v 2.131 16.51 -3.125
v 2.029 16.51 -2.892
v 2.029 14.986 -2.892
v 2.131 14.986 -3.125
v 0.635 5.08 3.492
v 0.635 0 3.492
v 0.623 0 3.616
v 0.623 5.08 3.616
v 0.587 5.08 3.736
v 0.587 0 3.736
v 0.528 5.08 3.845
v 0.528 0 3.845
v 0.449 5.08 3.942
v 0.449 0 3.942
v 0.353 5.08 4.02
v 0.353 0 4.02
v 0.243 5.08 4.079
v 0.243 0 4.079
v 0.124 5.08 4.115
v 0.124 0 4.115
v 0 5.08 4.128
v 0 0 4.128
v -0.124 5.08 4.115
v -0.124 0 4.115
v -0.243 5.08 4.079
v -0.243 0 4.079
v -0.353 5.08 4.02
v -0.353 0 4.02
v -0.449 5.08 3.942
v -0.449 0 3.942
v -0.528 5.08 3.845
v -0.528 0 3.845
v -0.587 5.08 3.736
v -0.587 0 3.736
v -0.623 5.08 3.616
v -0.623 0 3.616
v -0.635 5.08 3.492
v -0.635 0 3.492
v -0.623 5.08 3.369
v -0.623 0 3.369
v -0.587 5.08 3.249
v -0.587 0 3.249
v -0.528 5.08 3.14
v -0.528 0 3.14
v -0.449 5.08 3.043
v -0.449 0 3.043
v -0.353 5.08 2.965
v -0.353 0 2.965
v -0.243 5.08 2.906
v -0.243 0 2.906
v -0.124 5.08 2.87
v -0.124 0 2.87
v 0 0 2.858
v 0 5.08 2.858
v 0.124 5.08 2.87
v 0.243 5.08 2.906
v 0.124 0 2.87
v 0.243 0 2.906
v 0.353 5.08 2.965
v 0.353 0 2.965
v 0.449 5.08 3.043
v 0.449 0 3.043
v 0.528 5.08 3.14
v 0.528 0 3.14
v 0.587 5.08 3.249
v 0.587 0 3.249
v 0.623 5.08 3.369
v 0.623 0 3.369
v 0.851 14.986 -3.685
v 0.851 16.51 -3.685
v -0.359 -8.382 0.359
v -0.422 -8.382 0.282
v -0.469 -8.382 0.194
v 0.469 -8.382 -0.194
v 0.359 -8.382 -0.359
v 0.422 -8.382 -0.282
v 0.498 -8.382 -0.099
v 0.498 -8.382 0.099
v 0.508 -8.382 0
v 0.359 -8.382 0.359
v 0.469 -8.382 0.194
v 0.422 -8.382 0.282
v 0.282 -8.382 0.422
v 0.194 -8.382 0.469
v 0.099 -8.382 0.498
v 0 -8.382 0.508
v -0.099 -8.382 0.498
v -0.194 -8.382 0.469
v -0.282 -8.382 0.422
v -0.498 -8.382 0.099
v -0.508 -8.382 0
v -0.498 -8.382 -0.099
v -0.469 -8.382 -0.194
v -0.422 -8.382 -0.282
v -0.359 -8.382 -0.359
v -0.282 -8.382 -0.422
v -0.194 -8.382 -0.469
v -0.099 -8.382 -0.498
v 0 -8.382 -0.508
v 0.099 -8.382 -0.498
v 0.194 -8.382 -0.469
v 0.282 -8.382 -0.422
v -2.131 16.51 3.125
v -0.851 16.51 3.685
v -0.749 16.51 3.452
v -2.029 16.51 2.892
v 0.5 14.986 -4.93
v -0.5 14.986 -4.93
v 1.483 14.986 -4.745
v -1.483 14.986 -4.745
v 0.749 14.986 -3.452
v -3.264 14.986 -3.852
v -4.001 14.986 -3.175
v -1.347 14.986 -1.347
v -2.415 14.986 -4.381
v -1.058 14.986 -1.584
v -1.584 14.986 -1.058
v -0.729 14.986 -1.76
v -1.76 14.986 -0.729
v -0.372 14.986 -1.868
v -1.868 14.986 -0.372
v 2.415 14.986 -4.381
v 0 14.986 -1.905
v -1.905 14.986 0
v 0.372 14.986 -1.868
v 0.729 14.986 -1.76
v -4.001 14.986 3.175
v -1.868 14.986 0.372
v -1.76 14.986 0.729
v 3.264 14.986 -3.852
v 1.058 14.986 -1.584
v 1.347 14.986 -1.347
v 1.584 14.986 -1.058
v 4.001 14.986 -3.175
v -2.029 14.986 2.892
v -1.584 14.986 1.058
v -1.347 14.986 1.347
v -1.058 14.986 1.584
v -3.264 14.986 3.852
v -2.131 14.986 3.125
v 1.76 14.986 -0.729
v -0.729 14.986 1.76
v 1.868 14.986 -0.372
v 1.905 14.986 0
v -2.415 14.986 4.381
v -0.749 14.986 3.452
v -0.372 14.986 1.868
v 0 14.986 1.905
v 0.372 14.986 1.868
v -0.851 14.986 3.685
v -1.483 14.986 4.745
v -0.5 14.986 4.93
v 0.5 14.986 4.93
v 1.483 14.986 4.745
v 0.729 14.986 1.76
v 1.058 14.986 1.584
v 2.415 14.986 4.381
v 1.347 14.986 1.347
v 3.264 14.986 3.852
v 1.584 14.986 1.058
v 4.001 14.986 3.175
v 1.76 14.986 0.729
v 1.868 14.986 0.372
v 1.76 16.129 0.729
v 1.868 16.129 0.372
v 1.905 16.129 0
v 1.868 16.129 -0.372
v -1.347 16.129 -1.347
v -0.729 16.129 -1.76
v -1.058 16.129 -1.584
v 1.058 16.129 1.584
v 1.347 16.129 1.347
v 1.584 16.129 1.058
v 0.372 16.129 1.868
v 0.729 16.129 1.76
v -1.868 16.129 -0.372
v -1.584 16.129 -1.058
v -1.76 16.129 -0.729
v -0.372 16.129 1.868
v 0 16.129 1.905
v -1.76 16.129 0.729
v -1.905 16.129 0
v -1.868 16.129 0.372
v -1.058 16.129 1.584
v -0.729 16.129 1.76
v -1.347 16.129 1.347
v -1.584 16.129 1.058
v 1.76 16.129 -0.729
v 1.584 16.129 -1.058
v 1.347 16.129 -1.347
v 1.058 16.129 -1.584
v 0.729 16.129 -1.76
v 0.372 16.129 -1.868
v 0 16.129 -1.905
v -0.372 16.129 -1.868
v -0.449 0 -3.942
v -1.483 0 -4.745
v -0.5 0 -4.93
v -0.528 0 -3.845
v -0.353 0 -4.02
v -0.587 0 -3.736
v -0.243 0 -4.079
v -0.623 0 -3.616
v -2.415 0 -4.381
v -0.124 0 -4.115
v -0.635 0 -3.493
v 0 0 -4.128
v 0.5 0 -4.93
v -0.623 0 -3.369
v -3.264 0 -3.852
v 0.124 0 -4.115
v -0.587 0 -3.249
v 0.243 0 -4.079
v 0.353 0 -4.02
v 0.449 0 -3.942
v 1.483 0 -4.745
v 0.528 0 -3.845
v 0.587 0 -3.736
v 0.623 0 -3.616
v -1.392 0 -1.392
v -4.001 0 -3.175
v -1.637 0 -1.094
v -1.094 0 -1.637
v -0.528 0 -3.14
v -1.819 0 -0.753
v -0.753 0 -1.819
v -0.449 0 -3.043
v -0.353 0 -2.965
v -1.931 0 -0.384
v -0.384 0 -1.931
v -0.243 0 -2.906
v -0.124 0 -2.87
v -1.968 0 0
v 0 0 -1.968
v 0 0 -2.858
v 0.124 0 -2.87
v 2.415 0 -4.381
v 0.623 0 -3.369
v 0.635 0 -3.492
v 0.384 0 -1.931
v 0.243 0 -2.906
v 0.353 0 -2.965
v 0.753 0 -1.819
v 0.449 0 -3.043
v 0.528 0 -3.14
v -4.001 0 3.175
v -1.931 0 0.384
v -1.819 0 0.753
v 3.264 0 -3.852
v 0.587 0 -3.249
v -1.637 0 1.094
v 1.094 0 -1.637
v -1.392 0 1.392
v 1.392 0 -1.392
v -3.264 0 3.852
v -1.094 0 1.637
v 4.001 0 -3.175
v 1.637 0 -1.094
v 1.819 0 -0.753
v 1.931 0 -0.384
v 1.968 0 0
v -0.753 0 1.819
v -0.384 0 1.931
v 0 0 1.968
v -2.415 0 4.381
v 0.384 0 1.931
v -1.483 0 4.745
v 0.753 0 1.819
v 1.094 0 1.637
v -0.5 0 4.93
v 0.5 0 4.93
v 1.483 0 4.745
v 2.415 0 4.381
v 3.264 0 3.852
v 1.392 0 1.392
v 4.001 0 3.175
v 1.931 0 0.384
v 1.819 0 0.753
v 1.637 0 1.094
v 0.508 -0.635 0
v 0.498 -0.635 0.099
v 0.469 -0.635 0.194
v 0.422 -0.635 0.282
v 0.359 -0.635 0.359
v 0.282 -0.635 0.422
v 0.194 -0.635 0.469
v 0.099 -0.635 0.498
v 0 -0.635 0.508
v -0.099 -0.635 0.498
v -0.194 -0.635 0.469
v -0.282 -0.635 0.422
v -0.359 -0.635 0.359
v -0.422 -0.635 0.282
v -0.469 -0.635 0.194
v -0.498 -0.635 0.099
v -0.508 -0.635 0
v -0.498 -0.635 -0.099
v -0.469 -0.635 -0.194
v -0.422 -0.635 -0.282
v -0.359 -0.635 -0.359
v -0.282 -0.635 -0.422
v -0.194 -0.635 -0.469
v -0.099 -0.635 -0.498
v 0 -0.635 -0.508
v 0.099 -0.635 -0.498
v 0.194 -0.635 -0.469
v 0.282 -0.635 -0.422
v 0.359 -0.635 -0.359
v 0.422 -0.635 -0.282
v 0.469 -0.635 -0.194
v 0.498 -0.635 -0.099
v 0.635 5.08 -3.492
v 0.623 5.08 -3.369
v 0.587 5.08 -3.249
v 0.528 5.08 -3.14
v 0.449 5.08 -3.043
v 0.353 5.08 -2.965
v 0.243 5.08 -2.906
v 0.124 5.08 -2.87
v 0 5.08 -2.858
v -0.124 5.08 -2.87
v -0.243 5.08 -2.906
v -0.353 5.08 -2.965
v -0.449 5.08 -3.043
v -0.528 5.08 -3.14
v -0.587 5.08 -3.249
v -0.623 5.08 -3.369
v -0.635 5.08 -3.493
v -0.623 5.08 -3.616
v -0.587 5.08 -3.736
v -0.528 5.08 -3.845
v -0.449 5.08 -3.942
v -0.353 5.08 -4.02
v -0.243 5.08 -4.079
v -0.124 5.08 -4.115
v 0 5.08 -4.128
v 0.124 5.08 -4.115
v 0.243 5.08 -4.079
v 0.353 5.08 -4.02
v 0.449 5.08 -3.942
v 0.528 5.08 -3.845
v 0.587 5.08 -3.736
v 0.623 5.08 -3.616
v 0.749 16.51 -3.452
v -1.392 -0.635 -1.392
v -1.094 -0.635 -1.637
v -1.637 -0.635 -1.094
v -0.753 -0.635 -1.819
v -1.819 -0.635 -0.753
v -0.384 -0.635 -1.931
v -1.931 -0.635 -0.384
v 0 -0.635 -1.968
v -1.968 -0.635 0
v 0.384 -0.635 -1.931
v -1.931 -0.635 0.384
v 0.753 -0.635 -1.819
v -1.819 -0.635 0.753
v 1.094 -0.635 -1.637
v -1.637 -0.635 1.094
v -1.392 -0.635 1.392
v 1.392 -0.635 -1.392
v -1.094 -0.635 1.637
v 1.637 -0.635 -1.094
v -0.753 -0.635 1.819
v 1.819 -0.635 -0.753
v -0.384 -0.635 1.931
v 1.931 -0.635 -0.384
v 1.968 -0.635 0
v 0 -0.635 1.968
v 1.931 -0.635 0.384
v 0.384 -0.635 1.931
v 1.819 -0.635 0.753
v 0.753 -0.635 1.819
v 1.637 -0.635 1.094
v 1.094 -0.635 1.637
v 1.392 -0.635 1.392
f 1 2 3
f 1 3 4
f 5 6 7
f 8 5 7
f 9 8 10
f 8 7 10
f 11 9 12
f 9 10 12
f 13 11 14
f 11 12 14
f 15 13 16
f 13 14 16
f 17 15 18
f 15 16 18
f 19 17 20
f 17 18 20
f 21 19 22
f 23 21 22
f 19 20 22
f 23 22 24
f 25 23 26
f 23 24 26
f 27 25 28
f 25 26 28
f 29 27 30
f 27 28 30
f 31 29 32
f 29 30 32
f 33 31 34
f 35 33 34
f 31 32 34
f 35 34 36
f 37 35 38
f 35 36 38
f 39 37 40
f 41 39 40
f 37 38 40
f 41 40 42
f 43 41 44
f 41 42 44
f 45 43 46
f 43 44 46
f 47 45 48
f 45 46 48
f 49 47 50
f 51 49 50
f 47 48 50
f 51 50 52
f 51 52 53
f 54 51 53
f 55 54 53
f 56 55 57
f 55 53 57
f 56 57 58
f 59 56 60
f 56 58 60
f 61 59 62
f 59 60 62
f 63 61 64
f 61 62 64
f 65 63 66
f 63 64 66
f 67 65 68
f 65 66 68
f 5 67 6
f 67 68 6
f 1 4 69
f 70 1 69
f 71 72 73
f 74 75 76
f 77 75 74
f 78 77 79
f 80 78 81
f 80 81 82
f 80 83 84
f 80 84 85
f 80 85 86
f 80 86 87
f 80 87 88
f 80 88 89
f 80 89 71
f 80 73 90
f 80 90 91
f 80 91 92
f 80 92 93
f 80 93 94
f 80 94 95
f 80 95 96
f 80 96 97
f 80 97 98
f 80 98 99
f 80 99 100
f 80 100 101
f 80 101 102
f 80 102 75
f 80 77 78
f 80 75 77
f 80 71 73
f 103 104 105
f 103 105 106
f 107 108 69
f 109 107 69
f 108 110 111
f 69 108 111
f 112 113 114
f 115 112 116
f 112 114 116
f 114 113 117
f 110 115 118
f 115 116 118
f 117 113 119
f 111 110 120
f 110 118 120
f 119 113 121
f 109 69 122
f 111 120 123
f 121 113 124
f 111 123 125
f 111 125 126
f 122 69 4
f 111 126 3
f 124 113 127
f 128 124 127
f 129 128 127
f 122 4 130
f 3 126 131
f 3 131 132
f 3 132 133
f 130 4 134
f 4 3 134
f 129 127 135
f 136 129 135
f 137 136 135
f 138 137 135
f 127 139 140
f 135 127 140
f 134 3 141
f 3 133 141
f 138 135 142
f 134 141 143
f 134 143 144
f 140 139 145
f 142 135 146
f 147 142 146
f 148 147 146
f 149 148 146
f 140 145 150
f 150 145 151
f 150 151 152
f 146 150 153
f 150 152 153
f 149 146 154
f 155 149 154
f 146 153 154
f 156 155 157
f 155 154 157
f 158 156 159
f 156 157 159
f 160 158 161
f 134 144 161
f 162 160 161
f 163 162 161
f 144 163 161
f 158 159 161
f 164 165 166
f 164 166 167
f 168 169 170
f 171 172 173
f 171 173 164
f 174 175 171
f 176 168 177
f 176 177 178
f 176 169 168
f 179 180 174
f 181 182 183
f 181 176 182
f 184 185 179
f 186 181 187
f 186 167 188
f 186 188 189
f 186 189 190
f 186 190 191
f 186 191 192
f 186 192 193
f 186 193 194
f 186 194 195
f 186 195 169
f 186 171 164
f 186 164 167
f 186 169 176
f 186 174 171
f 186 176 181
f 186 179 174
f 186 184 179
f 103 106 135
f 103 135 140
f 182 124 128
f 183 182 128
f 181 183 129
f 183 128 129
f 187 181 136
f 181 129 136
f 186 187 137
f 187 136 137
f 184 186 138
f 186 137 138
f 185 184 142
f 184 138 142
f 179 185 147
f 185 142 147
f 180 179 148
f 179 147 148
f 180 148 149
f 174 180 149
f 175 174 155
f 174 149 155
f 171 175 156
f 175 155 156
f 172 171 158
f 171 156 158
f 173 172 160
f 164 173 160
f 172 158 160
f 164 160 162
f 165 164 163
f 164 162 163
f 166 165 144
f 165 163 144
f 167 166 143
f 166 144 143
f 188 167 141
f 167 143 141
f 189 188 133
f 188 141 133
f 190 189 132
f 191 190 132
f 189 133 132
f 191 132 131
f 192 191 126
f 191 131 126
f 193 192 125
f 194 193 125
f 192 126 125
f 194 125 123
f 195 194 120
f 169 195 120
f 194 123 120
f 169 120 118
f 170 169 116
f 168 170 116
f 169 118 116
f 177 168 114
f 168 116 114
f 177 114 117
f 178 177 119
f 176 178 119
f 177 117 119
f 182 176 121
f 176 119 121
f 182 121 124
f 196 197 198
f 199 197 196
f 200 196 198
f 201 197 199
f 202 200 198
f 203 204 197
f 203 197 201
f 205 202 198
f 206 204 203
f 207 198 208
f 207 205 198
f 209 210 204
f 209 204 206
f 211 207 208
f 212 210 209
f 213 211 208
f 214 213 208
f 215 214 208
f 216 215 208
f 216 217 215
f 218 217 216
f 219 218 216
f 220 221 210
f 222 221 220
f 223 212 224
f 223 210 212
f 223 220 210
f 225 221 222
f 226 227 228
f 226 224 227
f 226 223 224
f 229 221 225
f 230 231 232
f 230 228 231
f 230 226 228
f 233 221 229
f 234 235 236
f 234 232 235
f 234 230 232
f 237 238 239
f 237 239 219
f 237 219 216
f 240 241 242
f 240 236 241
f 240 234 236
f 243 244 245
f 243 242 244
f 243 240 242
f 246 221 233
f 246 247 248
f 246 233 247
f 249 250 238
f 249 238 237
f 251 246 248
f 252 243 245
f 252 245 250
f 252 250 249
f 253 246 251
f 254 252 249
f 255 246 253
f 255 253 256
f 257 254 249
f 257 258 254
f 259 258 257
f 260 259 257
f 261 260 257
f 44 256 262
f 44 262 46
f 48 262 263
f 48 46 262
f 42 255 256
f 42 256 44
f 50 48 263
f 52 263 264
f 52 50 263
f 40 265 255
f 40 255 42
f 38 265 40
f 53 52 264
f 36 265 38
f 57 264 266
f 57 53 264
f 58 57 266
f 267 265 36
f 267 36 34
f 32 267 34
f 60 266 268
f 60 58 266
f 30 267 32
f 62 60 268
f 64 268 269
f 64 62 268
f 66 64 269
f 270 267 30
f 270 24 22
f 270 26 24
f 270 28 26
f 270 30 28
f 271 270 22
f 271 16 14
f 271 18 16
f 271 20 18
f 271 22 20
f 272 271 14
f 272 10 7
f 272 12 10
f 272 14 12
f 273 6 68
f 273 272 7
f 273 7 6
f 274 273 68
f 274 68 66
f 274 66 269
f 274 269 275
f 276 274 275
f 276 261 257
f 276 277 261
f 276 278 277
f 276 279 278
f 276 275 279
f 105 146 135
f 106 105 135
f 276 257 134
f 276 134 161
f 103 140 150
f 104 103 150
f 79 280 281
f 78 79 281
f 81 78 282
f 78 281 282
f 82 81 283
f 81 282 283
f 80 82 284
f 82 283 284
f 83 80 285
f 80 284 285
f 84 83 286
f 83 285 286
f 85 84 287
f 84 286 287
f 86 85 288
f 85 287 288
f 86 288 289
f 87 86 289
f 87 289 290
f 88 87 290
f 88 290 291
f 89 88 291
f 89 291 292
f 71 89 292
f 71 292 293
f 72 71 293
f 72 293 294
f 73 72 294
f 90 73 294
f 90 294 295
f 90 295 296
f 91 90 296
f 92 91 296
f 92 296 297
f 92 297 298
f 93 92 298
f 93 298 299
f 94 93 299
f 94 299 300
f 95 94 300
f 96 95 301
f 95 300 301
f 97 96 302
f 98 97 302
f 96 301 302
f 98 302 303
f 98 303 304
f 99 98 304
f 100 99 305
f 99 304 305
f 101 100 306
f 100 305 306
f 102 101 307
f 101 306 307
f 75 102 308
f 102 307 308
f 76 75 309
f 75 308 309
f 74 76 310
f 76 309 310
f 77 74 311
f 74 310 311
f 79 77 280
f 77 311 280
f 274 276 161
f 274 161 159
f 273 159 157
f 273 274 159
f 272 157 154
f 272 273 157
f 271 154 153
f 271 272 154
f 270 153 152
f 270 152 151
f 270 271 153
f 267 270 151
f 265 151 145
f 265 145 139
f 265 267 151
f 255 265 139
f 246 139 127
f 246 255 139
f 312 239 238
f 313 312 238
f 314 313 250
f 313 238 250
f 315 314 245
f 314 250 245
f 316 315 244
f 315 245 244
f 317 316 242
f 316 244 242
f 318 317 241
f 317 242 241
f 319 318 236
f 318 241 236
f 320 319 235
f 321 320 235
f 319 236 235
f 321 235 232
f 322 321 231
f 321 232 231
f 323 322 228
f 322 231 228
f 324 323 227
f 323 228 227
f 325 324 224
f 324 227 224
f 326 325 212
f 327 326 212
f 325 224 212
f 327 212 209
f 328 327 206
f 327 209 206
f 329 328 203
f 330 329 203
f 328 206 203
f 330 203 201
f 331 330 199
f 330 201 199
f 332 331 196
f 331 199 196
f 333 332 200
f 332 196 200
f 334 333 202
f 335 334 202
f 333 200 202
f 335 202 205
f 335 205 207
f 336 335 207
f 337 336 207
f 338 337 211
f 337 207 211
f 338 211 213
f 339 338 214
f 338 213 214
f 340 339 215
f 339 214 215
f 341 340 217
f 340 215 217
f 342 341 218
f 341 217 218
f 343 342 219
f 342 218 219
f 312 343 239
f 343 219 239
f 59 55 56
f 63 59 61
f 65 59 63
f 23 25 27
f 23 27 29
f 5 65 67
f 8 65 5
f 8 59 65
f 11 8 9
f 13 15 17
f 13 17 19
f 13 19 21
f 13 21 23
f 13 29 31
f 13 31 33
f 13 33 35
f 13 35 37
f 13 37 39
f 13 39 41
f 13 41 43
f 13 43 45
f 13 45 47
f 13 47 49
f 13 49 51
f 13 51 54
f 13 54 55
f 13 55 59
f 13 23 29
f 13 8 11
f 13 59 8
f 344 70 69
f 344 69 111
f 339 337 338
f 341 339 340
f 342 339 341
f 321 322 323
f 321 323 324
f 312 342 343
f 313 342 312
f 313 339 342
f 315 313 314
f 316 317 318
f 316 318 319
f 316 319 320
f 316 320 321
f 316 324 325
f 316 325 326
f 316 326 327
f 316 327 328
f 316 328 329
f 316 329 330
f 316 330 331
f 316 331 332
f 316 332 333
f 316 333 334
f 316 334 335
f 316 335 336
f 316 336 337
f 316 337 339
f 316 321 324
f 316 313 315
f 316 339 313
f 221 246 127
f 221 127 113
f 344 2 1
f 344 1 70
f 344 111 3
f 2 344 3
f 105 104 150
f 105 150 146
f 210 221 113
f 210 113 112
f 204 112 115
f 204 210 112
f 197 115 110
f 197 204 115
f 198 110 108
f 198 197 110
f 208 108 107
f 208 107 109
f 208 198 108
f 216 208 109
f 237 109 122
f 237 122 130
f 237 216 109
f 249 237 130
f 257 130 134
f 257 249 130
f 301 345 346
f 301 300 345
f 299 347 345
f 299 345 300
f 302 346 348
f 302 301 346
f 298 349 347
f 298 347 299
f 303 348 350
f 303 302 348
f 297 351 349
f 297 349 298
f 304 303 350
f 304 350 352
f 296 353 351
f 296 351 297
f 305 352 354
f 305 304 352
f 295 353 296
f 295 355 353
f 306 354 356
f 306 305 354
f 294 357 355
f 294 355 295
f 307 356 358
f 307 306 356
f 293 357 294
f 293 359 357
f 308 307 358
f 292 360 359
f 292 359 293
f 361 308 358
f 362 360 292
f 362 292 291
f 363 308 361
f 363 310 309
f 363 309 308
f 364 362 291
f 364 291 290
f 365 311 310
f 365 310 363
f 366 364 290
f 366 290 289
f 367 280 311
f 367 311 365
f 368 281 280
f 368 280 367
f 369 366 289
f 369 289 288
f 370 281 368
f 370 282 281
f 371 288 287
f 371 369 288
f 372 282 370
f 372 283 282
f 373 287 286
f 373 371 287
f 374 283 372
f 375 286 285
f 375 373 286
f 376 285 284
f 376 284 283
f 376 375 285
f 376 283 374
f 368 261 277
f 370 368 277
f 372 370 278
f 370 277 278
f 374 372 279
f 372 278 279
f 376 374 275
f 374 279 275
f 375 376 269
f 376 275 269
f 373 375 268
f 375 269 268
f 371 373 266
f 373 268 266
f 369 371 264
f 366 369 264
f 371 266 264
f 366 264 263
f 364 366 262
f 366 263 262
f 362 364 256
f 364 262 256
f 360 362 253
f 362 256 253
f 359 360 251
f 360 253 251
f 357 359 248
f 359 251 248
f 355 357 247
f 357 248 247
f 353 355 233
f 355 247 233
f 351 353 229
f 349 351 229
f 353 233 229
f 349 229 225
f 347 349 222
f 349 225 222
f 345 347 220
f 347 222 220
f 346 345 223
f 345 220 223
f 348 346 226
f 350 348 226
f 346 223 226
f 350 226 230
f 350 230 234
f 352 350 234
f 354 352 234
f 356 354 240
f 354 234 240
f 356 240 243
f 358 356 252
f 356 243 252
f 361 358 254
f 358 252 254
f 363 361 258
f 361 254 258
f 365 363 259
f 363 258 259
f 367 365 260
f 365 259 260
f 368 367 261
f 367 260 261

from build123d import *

# Parameters (mm, degrees)
F1_DEPTH  = 14.986
F2_R      = 0.508
F3_DEPTH  = 8.382
F4_R      = 0.635
F5_DEPTH  = 5.08
F6_R      = 1.9685
F7_DEPTH  = 0.635
F8_R      = 1.905
F9_DEPTH  = 1.143
F11_DEPTH = 1.524


with BuildPart() as f1:
    # F0 (on Front) → F1 (new body)
    with BuildSketch(Plane.XZ):
        with BuildLine():
            Line((4.0005, -3.175), (4.0005, 3.175))
            ThreePointArc((4.0005, 3.175), (0, 4.953), (-4.0005, 3.175))
            Line((-4.0005, 3.175), (-4.0005, -3.175))
            ThreePointArc((-4.0005, -3.175), (0, -4.953), (4.0005, -3.175))
        make_face()
    extrude(amount=-F1_DEPTH)

    # F2 (on face) → F3 (join)
    with BuildSketch(Plane.XZ):
        Circle(F2_R)
    extrude(amount=F3_DEPTH)

    # F4 (on face) → F5 (cut)
    with BuildSketch(Plane.XZ):
        with Locations((0, 3.4925)):
            Circle(F4_R)
        with Locations((0, -3.4925)):
            Circle(F4_R)
    extrude(amount=-F5_DEPTH, mode=Mode.SUBTRACT)

    # F6 (on face) → F7 (join)
    with BuildSketch(Plane.XZ):
        Circle(F6_R)
    extrude(amount=F7_DEPTH)

    # F8 (on face) → F9 (join)
    with BuildSketch(Plane(origin=(0, 14.986, 0), x_dir=(-1, 0, 0), z_dir=(0, 1, 0))):
        Circle(F8_R)
    extrude(amount=F9_DEPTH)

    # F10 (on face) → F11 (join)
    with BuildSketch(Plane(origin=(0, 14.986, 0), x_dir=(-1, 0, 0), z_dir=(0, 1, 0))):
        Polygon((-2.028809, -2.891869), (-2.13069, -3.124541), (-0.850995, -3.684889), (-0.749114, -3.452217), align=None)
        Polygon((0.850995, 3.684889), (0.749114, 3.452217), (2.028809, 2.891869), (2.13069, 3.124541), align=None)
    extrude(amount=F11_DEPTH)


solid = f1.part
